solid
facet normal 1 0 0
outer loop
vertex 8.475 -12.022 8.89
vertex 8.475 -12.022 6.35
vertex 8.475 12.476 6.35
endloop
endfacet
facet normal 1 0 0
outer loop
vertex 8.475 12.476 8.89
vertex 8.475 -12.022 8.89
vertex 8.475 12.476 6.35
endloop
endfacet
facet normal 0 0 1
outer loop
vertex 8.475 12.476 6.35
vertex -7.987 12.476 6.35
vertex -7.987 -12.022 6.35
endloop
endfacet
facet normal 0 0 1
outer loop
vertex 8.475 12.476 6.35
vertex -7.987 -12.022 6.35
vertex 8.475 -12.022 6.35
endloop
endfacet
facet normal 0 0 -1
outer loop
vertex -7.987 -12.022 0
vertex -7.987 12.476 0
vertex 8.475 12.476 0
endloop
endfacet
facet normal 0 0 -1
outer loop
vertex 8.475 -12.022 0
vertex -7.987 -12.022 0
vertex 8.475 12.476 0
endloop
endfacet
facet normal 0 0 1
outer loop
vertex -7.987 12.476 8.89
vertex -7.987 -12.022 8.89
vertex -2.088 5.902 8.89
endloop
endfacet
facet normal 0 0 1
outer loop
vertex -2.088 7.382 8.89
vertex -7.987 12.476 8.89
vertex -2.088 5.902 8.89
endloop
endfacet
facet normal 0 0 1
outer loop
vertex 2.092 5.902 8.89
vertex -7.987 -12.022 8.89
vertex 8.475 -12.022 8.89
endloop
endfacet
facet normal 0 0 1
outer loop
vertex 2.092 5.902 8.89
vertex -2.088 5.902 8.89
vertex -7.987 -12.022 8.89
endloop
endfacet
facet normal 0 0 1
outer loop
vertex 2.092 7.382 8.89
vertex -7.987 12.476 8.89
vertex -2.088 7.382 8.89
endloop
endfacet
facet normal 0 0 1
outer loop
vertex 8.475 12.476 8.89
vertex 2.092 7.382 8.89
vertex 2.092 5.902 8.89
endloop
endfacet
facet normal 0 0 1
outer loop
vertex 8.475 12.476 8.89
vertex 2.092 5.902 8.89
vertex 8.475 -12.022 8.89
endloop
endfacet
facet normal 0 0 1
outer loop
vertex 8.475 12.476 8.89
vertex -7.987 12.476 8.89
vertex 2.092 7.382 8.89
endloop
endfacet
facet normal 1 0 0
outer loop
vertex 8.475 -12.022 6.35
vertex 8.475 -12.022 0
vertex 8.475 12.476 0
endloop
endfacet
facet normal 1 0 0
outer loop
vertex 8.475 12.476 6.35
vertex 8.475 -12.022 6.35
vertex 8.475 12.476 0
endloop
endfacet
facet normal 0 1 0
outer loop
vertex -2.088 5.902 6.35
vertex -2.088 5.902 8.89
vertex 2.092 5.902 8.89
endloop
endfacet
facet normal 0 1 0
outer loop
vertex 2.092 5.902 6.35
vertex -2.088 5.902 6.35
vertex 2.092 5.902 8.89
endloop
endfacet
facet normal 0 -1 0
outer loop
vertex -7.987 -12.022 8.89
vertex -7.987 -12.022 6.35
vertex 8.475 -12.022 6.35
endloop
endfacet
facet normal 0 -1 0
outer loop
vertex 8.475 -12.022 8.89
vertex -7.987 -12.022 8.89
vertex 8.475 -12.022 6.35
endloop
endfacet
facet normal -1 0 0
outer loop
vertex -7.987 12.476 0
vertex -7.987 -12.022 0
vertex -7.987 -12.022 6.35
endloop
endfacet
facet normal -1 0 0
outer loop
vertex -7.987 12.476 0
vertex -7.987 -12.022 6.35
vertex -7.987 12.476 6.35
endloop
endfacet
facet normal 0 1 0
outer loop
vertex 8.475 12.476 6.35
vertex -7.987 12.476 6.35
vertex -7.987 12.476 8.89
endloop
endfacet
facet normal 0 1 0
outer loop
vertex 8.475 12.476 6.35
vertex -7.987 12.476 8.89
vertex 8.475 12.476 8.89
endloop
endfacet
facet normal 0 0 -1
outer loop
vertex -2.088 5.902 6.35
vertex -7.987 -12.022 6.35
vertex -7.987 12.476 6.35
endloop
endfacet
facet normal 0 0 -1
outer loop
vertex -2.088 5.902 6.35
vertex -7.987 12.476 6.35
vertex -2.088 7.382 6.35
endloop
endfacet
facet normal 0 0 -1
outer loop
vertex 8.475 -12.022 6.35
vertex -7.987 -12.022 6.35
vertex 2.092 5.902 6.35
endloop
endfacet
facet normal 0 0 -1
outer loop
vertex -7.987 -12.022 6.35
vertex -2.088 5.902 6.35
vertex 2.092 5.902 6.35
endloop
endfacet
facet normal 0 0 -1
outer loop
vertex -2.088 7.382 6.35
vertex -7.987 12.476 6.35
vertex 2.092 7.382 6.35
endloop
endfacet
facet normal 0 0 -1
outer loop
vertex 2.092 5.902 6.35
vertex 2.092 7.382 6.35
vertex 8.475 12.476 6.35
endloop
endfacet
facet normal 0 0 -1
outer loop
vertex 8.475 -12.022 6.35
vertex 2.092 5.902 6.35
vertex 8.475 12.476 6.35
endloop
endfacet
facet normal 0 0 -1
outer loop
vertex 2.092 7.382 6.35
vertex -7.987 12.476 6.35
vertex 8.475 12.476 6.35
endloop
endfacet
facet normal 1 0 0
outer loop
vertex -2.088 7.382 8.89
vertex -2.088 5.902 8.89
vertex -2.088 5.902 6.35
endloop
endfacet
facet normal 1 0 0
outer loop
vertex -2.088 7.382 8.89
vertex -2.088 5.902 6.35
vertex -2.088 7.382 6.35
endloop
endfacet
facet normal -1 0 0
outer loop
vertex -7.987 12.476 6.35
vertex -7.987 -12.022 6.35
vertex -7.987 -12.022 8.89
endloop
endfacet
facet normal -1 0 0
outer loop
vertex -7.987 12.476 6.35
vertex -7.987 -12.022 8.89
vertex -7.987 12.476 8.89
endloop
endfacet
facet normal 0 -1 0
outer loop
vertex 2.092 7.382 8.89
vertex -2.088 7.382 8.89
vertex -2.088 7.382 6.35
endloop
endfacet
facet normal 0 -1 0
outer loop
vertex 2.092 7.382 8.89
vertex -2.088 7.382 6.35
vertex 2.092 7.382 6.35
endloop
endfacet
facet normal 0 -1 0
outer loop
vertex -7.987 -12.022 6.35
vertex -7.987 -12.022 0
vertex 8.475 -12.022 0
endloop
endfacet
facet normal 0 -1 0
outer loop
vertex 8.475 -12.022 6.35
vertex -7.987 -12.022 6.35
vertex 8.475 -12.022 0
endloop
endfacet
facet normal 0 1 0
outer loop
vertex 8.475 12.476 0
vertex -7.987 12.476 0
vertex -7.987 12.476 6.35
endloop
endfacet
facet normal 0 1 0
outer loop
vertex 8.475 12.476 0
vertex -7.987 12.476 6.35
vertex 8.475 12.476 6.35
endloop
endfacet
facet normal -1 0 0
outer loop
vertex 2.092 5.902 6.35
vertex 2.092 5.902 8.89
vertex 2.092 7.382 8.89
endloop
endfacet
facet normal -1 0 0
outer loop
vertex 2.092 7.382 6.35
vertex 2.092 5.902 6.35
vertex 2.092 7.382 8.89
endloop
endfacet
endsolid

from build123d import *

# Parameters (mm, degrees)
F0_W     = 16.462284606
F0_H     = 24.4974466041
F1_DEPTH = 6.35
F2_W     = 16.462284606
F2_H     = 24.4974466041
F3_DEPTH = 2.54
F4_W     = 4.1798030725
F4_H     = 1.4798403718
F5_DEPTH = 2.54


# Not quite as in the source:
# - a feature names something its author has since deleted; it is built from what else it names


with BuildPart() as f1:
    # F0 (on Top) → F1 (new body)
    with BuildSketch(Plane.XY):
        with Locations((0.2442786936, 0.227171462)):
            Rectangle(F0_W, F0_H)
    extrude(amount=F1_DEPTH)


with BuildPart() as f3:
    # F2 (on face) → F3 (new body)
    with BuildSketch(Plane.XY.offset(6.35)):
        with Locations((0.2442786936, 0.227171462)):
            Rectangle(F2_W, F2_H)
    extrude(amount=F3_DEPTH)

    # F4 (on face) → F5 (cut)
    with BuildSketch(Plane.XY.offset(8.89)):
        with Locations((0.0016469858, 6.6424182151)):
            Rectangle(F4_W, F4_H)
    extrude(amount=-F5_DEPTH, mode=Mode.SUBTRACT)


solid = Compound([f1.part, f3.part])
